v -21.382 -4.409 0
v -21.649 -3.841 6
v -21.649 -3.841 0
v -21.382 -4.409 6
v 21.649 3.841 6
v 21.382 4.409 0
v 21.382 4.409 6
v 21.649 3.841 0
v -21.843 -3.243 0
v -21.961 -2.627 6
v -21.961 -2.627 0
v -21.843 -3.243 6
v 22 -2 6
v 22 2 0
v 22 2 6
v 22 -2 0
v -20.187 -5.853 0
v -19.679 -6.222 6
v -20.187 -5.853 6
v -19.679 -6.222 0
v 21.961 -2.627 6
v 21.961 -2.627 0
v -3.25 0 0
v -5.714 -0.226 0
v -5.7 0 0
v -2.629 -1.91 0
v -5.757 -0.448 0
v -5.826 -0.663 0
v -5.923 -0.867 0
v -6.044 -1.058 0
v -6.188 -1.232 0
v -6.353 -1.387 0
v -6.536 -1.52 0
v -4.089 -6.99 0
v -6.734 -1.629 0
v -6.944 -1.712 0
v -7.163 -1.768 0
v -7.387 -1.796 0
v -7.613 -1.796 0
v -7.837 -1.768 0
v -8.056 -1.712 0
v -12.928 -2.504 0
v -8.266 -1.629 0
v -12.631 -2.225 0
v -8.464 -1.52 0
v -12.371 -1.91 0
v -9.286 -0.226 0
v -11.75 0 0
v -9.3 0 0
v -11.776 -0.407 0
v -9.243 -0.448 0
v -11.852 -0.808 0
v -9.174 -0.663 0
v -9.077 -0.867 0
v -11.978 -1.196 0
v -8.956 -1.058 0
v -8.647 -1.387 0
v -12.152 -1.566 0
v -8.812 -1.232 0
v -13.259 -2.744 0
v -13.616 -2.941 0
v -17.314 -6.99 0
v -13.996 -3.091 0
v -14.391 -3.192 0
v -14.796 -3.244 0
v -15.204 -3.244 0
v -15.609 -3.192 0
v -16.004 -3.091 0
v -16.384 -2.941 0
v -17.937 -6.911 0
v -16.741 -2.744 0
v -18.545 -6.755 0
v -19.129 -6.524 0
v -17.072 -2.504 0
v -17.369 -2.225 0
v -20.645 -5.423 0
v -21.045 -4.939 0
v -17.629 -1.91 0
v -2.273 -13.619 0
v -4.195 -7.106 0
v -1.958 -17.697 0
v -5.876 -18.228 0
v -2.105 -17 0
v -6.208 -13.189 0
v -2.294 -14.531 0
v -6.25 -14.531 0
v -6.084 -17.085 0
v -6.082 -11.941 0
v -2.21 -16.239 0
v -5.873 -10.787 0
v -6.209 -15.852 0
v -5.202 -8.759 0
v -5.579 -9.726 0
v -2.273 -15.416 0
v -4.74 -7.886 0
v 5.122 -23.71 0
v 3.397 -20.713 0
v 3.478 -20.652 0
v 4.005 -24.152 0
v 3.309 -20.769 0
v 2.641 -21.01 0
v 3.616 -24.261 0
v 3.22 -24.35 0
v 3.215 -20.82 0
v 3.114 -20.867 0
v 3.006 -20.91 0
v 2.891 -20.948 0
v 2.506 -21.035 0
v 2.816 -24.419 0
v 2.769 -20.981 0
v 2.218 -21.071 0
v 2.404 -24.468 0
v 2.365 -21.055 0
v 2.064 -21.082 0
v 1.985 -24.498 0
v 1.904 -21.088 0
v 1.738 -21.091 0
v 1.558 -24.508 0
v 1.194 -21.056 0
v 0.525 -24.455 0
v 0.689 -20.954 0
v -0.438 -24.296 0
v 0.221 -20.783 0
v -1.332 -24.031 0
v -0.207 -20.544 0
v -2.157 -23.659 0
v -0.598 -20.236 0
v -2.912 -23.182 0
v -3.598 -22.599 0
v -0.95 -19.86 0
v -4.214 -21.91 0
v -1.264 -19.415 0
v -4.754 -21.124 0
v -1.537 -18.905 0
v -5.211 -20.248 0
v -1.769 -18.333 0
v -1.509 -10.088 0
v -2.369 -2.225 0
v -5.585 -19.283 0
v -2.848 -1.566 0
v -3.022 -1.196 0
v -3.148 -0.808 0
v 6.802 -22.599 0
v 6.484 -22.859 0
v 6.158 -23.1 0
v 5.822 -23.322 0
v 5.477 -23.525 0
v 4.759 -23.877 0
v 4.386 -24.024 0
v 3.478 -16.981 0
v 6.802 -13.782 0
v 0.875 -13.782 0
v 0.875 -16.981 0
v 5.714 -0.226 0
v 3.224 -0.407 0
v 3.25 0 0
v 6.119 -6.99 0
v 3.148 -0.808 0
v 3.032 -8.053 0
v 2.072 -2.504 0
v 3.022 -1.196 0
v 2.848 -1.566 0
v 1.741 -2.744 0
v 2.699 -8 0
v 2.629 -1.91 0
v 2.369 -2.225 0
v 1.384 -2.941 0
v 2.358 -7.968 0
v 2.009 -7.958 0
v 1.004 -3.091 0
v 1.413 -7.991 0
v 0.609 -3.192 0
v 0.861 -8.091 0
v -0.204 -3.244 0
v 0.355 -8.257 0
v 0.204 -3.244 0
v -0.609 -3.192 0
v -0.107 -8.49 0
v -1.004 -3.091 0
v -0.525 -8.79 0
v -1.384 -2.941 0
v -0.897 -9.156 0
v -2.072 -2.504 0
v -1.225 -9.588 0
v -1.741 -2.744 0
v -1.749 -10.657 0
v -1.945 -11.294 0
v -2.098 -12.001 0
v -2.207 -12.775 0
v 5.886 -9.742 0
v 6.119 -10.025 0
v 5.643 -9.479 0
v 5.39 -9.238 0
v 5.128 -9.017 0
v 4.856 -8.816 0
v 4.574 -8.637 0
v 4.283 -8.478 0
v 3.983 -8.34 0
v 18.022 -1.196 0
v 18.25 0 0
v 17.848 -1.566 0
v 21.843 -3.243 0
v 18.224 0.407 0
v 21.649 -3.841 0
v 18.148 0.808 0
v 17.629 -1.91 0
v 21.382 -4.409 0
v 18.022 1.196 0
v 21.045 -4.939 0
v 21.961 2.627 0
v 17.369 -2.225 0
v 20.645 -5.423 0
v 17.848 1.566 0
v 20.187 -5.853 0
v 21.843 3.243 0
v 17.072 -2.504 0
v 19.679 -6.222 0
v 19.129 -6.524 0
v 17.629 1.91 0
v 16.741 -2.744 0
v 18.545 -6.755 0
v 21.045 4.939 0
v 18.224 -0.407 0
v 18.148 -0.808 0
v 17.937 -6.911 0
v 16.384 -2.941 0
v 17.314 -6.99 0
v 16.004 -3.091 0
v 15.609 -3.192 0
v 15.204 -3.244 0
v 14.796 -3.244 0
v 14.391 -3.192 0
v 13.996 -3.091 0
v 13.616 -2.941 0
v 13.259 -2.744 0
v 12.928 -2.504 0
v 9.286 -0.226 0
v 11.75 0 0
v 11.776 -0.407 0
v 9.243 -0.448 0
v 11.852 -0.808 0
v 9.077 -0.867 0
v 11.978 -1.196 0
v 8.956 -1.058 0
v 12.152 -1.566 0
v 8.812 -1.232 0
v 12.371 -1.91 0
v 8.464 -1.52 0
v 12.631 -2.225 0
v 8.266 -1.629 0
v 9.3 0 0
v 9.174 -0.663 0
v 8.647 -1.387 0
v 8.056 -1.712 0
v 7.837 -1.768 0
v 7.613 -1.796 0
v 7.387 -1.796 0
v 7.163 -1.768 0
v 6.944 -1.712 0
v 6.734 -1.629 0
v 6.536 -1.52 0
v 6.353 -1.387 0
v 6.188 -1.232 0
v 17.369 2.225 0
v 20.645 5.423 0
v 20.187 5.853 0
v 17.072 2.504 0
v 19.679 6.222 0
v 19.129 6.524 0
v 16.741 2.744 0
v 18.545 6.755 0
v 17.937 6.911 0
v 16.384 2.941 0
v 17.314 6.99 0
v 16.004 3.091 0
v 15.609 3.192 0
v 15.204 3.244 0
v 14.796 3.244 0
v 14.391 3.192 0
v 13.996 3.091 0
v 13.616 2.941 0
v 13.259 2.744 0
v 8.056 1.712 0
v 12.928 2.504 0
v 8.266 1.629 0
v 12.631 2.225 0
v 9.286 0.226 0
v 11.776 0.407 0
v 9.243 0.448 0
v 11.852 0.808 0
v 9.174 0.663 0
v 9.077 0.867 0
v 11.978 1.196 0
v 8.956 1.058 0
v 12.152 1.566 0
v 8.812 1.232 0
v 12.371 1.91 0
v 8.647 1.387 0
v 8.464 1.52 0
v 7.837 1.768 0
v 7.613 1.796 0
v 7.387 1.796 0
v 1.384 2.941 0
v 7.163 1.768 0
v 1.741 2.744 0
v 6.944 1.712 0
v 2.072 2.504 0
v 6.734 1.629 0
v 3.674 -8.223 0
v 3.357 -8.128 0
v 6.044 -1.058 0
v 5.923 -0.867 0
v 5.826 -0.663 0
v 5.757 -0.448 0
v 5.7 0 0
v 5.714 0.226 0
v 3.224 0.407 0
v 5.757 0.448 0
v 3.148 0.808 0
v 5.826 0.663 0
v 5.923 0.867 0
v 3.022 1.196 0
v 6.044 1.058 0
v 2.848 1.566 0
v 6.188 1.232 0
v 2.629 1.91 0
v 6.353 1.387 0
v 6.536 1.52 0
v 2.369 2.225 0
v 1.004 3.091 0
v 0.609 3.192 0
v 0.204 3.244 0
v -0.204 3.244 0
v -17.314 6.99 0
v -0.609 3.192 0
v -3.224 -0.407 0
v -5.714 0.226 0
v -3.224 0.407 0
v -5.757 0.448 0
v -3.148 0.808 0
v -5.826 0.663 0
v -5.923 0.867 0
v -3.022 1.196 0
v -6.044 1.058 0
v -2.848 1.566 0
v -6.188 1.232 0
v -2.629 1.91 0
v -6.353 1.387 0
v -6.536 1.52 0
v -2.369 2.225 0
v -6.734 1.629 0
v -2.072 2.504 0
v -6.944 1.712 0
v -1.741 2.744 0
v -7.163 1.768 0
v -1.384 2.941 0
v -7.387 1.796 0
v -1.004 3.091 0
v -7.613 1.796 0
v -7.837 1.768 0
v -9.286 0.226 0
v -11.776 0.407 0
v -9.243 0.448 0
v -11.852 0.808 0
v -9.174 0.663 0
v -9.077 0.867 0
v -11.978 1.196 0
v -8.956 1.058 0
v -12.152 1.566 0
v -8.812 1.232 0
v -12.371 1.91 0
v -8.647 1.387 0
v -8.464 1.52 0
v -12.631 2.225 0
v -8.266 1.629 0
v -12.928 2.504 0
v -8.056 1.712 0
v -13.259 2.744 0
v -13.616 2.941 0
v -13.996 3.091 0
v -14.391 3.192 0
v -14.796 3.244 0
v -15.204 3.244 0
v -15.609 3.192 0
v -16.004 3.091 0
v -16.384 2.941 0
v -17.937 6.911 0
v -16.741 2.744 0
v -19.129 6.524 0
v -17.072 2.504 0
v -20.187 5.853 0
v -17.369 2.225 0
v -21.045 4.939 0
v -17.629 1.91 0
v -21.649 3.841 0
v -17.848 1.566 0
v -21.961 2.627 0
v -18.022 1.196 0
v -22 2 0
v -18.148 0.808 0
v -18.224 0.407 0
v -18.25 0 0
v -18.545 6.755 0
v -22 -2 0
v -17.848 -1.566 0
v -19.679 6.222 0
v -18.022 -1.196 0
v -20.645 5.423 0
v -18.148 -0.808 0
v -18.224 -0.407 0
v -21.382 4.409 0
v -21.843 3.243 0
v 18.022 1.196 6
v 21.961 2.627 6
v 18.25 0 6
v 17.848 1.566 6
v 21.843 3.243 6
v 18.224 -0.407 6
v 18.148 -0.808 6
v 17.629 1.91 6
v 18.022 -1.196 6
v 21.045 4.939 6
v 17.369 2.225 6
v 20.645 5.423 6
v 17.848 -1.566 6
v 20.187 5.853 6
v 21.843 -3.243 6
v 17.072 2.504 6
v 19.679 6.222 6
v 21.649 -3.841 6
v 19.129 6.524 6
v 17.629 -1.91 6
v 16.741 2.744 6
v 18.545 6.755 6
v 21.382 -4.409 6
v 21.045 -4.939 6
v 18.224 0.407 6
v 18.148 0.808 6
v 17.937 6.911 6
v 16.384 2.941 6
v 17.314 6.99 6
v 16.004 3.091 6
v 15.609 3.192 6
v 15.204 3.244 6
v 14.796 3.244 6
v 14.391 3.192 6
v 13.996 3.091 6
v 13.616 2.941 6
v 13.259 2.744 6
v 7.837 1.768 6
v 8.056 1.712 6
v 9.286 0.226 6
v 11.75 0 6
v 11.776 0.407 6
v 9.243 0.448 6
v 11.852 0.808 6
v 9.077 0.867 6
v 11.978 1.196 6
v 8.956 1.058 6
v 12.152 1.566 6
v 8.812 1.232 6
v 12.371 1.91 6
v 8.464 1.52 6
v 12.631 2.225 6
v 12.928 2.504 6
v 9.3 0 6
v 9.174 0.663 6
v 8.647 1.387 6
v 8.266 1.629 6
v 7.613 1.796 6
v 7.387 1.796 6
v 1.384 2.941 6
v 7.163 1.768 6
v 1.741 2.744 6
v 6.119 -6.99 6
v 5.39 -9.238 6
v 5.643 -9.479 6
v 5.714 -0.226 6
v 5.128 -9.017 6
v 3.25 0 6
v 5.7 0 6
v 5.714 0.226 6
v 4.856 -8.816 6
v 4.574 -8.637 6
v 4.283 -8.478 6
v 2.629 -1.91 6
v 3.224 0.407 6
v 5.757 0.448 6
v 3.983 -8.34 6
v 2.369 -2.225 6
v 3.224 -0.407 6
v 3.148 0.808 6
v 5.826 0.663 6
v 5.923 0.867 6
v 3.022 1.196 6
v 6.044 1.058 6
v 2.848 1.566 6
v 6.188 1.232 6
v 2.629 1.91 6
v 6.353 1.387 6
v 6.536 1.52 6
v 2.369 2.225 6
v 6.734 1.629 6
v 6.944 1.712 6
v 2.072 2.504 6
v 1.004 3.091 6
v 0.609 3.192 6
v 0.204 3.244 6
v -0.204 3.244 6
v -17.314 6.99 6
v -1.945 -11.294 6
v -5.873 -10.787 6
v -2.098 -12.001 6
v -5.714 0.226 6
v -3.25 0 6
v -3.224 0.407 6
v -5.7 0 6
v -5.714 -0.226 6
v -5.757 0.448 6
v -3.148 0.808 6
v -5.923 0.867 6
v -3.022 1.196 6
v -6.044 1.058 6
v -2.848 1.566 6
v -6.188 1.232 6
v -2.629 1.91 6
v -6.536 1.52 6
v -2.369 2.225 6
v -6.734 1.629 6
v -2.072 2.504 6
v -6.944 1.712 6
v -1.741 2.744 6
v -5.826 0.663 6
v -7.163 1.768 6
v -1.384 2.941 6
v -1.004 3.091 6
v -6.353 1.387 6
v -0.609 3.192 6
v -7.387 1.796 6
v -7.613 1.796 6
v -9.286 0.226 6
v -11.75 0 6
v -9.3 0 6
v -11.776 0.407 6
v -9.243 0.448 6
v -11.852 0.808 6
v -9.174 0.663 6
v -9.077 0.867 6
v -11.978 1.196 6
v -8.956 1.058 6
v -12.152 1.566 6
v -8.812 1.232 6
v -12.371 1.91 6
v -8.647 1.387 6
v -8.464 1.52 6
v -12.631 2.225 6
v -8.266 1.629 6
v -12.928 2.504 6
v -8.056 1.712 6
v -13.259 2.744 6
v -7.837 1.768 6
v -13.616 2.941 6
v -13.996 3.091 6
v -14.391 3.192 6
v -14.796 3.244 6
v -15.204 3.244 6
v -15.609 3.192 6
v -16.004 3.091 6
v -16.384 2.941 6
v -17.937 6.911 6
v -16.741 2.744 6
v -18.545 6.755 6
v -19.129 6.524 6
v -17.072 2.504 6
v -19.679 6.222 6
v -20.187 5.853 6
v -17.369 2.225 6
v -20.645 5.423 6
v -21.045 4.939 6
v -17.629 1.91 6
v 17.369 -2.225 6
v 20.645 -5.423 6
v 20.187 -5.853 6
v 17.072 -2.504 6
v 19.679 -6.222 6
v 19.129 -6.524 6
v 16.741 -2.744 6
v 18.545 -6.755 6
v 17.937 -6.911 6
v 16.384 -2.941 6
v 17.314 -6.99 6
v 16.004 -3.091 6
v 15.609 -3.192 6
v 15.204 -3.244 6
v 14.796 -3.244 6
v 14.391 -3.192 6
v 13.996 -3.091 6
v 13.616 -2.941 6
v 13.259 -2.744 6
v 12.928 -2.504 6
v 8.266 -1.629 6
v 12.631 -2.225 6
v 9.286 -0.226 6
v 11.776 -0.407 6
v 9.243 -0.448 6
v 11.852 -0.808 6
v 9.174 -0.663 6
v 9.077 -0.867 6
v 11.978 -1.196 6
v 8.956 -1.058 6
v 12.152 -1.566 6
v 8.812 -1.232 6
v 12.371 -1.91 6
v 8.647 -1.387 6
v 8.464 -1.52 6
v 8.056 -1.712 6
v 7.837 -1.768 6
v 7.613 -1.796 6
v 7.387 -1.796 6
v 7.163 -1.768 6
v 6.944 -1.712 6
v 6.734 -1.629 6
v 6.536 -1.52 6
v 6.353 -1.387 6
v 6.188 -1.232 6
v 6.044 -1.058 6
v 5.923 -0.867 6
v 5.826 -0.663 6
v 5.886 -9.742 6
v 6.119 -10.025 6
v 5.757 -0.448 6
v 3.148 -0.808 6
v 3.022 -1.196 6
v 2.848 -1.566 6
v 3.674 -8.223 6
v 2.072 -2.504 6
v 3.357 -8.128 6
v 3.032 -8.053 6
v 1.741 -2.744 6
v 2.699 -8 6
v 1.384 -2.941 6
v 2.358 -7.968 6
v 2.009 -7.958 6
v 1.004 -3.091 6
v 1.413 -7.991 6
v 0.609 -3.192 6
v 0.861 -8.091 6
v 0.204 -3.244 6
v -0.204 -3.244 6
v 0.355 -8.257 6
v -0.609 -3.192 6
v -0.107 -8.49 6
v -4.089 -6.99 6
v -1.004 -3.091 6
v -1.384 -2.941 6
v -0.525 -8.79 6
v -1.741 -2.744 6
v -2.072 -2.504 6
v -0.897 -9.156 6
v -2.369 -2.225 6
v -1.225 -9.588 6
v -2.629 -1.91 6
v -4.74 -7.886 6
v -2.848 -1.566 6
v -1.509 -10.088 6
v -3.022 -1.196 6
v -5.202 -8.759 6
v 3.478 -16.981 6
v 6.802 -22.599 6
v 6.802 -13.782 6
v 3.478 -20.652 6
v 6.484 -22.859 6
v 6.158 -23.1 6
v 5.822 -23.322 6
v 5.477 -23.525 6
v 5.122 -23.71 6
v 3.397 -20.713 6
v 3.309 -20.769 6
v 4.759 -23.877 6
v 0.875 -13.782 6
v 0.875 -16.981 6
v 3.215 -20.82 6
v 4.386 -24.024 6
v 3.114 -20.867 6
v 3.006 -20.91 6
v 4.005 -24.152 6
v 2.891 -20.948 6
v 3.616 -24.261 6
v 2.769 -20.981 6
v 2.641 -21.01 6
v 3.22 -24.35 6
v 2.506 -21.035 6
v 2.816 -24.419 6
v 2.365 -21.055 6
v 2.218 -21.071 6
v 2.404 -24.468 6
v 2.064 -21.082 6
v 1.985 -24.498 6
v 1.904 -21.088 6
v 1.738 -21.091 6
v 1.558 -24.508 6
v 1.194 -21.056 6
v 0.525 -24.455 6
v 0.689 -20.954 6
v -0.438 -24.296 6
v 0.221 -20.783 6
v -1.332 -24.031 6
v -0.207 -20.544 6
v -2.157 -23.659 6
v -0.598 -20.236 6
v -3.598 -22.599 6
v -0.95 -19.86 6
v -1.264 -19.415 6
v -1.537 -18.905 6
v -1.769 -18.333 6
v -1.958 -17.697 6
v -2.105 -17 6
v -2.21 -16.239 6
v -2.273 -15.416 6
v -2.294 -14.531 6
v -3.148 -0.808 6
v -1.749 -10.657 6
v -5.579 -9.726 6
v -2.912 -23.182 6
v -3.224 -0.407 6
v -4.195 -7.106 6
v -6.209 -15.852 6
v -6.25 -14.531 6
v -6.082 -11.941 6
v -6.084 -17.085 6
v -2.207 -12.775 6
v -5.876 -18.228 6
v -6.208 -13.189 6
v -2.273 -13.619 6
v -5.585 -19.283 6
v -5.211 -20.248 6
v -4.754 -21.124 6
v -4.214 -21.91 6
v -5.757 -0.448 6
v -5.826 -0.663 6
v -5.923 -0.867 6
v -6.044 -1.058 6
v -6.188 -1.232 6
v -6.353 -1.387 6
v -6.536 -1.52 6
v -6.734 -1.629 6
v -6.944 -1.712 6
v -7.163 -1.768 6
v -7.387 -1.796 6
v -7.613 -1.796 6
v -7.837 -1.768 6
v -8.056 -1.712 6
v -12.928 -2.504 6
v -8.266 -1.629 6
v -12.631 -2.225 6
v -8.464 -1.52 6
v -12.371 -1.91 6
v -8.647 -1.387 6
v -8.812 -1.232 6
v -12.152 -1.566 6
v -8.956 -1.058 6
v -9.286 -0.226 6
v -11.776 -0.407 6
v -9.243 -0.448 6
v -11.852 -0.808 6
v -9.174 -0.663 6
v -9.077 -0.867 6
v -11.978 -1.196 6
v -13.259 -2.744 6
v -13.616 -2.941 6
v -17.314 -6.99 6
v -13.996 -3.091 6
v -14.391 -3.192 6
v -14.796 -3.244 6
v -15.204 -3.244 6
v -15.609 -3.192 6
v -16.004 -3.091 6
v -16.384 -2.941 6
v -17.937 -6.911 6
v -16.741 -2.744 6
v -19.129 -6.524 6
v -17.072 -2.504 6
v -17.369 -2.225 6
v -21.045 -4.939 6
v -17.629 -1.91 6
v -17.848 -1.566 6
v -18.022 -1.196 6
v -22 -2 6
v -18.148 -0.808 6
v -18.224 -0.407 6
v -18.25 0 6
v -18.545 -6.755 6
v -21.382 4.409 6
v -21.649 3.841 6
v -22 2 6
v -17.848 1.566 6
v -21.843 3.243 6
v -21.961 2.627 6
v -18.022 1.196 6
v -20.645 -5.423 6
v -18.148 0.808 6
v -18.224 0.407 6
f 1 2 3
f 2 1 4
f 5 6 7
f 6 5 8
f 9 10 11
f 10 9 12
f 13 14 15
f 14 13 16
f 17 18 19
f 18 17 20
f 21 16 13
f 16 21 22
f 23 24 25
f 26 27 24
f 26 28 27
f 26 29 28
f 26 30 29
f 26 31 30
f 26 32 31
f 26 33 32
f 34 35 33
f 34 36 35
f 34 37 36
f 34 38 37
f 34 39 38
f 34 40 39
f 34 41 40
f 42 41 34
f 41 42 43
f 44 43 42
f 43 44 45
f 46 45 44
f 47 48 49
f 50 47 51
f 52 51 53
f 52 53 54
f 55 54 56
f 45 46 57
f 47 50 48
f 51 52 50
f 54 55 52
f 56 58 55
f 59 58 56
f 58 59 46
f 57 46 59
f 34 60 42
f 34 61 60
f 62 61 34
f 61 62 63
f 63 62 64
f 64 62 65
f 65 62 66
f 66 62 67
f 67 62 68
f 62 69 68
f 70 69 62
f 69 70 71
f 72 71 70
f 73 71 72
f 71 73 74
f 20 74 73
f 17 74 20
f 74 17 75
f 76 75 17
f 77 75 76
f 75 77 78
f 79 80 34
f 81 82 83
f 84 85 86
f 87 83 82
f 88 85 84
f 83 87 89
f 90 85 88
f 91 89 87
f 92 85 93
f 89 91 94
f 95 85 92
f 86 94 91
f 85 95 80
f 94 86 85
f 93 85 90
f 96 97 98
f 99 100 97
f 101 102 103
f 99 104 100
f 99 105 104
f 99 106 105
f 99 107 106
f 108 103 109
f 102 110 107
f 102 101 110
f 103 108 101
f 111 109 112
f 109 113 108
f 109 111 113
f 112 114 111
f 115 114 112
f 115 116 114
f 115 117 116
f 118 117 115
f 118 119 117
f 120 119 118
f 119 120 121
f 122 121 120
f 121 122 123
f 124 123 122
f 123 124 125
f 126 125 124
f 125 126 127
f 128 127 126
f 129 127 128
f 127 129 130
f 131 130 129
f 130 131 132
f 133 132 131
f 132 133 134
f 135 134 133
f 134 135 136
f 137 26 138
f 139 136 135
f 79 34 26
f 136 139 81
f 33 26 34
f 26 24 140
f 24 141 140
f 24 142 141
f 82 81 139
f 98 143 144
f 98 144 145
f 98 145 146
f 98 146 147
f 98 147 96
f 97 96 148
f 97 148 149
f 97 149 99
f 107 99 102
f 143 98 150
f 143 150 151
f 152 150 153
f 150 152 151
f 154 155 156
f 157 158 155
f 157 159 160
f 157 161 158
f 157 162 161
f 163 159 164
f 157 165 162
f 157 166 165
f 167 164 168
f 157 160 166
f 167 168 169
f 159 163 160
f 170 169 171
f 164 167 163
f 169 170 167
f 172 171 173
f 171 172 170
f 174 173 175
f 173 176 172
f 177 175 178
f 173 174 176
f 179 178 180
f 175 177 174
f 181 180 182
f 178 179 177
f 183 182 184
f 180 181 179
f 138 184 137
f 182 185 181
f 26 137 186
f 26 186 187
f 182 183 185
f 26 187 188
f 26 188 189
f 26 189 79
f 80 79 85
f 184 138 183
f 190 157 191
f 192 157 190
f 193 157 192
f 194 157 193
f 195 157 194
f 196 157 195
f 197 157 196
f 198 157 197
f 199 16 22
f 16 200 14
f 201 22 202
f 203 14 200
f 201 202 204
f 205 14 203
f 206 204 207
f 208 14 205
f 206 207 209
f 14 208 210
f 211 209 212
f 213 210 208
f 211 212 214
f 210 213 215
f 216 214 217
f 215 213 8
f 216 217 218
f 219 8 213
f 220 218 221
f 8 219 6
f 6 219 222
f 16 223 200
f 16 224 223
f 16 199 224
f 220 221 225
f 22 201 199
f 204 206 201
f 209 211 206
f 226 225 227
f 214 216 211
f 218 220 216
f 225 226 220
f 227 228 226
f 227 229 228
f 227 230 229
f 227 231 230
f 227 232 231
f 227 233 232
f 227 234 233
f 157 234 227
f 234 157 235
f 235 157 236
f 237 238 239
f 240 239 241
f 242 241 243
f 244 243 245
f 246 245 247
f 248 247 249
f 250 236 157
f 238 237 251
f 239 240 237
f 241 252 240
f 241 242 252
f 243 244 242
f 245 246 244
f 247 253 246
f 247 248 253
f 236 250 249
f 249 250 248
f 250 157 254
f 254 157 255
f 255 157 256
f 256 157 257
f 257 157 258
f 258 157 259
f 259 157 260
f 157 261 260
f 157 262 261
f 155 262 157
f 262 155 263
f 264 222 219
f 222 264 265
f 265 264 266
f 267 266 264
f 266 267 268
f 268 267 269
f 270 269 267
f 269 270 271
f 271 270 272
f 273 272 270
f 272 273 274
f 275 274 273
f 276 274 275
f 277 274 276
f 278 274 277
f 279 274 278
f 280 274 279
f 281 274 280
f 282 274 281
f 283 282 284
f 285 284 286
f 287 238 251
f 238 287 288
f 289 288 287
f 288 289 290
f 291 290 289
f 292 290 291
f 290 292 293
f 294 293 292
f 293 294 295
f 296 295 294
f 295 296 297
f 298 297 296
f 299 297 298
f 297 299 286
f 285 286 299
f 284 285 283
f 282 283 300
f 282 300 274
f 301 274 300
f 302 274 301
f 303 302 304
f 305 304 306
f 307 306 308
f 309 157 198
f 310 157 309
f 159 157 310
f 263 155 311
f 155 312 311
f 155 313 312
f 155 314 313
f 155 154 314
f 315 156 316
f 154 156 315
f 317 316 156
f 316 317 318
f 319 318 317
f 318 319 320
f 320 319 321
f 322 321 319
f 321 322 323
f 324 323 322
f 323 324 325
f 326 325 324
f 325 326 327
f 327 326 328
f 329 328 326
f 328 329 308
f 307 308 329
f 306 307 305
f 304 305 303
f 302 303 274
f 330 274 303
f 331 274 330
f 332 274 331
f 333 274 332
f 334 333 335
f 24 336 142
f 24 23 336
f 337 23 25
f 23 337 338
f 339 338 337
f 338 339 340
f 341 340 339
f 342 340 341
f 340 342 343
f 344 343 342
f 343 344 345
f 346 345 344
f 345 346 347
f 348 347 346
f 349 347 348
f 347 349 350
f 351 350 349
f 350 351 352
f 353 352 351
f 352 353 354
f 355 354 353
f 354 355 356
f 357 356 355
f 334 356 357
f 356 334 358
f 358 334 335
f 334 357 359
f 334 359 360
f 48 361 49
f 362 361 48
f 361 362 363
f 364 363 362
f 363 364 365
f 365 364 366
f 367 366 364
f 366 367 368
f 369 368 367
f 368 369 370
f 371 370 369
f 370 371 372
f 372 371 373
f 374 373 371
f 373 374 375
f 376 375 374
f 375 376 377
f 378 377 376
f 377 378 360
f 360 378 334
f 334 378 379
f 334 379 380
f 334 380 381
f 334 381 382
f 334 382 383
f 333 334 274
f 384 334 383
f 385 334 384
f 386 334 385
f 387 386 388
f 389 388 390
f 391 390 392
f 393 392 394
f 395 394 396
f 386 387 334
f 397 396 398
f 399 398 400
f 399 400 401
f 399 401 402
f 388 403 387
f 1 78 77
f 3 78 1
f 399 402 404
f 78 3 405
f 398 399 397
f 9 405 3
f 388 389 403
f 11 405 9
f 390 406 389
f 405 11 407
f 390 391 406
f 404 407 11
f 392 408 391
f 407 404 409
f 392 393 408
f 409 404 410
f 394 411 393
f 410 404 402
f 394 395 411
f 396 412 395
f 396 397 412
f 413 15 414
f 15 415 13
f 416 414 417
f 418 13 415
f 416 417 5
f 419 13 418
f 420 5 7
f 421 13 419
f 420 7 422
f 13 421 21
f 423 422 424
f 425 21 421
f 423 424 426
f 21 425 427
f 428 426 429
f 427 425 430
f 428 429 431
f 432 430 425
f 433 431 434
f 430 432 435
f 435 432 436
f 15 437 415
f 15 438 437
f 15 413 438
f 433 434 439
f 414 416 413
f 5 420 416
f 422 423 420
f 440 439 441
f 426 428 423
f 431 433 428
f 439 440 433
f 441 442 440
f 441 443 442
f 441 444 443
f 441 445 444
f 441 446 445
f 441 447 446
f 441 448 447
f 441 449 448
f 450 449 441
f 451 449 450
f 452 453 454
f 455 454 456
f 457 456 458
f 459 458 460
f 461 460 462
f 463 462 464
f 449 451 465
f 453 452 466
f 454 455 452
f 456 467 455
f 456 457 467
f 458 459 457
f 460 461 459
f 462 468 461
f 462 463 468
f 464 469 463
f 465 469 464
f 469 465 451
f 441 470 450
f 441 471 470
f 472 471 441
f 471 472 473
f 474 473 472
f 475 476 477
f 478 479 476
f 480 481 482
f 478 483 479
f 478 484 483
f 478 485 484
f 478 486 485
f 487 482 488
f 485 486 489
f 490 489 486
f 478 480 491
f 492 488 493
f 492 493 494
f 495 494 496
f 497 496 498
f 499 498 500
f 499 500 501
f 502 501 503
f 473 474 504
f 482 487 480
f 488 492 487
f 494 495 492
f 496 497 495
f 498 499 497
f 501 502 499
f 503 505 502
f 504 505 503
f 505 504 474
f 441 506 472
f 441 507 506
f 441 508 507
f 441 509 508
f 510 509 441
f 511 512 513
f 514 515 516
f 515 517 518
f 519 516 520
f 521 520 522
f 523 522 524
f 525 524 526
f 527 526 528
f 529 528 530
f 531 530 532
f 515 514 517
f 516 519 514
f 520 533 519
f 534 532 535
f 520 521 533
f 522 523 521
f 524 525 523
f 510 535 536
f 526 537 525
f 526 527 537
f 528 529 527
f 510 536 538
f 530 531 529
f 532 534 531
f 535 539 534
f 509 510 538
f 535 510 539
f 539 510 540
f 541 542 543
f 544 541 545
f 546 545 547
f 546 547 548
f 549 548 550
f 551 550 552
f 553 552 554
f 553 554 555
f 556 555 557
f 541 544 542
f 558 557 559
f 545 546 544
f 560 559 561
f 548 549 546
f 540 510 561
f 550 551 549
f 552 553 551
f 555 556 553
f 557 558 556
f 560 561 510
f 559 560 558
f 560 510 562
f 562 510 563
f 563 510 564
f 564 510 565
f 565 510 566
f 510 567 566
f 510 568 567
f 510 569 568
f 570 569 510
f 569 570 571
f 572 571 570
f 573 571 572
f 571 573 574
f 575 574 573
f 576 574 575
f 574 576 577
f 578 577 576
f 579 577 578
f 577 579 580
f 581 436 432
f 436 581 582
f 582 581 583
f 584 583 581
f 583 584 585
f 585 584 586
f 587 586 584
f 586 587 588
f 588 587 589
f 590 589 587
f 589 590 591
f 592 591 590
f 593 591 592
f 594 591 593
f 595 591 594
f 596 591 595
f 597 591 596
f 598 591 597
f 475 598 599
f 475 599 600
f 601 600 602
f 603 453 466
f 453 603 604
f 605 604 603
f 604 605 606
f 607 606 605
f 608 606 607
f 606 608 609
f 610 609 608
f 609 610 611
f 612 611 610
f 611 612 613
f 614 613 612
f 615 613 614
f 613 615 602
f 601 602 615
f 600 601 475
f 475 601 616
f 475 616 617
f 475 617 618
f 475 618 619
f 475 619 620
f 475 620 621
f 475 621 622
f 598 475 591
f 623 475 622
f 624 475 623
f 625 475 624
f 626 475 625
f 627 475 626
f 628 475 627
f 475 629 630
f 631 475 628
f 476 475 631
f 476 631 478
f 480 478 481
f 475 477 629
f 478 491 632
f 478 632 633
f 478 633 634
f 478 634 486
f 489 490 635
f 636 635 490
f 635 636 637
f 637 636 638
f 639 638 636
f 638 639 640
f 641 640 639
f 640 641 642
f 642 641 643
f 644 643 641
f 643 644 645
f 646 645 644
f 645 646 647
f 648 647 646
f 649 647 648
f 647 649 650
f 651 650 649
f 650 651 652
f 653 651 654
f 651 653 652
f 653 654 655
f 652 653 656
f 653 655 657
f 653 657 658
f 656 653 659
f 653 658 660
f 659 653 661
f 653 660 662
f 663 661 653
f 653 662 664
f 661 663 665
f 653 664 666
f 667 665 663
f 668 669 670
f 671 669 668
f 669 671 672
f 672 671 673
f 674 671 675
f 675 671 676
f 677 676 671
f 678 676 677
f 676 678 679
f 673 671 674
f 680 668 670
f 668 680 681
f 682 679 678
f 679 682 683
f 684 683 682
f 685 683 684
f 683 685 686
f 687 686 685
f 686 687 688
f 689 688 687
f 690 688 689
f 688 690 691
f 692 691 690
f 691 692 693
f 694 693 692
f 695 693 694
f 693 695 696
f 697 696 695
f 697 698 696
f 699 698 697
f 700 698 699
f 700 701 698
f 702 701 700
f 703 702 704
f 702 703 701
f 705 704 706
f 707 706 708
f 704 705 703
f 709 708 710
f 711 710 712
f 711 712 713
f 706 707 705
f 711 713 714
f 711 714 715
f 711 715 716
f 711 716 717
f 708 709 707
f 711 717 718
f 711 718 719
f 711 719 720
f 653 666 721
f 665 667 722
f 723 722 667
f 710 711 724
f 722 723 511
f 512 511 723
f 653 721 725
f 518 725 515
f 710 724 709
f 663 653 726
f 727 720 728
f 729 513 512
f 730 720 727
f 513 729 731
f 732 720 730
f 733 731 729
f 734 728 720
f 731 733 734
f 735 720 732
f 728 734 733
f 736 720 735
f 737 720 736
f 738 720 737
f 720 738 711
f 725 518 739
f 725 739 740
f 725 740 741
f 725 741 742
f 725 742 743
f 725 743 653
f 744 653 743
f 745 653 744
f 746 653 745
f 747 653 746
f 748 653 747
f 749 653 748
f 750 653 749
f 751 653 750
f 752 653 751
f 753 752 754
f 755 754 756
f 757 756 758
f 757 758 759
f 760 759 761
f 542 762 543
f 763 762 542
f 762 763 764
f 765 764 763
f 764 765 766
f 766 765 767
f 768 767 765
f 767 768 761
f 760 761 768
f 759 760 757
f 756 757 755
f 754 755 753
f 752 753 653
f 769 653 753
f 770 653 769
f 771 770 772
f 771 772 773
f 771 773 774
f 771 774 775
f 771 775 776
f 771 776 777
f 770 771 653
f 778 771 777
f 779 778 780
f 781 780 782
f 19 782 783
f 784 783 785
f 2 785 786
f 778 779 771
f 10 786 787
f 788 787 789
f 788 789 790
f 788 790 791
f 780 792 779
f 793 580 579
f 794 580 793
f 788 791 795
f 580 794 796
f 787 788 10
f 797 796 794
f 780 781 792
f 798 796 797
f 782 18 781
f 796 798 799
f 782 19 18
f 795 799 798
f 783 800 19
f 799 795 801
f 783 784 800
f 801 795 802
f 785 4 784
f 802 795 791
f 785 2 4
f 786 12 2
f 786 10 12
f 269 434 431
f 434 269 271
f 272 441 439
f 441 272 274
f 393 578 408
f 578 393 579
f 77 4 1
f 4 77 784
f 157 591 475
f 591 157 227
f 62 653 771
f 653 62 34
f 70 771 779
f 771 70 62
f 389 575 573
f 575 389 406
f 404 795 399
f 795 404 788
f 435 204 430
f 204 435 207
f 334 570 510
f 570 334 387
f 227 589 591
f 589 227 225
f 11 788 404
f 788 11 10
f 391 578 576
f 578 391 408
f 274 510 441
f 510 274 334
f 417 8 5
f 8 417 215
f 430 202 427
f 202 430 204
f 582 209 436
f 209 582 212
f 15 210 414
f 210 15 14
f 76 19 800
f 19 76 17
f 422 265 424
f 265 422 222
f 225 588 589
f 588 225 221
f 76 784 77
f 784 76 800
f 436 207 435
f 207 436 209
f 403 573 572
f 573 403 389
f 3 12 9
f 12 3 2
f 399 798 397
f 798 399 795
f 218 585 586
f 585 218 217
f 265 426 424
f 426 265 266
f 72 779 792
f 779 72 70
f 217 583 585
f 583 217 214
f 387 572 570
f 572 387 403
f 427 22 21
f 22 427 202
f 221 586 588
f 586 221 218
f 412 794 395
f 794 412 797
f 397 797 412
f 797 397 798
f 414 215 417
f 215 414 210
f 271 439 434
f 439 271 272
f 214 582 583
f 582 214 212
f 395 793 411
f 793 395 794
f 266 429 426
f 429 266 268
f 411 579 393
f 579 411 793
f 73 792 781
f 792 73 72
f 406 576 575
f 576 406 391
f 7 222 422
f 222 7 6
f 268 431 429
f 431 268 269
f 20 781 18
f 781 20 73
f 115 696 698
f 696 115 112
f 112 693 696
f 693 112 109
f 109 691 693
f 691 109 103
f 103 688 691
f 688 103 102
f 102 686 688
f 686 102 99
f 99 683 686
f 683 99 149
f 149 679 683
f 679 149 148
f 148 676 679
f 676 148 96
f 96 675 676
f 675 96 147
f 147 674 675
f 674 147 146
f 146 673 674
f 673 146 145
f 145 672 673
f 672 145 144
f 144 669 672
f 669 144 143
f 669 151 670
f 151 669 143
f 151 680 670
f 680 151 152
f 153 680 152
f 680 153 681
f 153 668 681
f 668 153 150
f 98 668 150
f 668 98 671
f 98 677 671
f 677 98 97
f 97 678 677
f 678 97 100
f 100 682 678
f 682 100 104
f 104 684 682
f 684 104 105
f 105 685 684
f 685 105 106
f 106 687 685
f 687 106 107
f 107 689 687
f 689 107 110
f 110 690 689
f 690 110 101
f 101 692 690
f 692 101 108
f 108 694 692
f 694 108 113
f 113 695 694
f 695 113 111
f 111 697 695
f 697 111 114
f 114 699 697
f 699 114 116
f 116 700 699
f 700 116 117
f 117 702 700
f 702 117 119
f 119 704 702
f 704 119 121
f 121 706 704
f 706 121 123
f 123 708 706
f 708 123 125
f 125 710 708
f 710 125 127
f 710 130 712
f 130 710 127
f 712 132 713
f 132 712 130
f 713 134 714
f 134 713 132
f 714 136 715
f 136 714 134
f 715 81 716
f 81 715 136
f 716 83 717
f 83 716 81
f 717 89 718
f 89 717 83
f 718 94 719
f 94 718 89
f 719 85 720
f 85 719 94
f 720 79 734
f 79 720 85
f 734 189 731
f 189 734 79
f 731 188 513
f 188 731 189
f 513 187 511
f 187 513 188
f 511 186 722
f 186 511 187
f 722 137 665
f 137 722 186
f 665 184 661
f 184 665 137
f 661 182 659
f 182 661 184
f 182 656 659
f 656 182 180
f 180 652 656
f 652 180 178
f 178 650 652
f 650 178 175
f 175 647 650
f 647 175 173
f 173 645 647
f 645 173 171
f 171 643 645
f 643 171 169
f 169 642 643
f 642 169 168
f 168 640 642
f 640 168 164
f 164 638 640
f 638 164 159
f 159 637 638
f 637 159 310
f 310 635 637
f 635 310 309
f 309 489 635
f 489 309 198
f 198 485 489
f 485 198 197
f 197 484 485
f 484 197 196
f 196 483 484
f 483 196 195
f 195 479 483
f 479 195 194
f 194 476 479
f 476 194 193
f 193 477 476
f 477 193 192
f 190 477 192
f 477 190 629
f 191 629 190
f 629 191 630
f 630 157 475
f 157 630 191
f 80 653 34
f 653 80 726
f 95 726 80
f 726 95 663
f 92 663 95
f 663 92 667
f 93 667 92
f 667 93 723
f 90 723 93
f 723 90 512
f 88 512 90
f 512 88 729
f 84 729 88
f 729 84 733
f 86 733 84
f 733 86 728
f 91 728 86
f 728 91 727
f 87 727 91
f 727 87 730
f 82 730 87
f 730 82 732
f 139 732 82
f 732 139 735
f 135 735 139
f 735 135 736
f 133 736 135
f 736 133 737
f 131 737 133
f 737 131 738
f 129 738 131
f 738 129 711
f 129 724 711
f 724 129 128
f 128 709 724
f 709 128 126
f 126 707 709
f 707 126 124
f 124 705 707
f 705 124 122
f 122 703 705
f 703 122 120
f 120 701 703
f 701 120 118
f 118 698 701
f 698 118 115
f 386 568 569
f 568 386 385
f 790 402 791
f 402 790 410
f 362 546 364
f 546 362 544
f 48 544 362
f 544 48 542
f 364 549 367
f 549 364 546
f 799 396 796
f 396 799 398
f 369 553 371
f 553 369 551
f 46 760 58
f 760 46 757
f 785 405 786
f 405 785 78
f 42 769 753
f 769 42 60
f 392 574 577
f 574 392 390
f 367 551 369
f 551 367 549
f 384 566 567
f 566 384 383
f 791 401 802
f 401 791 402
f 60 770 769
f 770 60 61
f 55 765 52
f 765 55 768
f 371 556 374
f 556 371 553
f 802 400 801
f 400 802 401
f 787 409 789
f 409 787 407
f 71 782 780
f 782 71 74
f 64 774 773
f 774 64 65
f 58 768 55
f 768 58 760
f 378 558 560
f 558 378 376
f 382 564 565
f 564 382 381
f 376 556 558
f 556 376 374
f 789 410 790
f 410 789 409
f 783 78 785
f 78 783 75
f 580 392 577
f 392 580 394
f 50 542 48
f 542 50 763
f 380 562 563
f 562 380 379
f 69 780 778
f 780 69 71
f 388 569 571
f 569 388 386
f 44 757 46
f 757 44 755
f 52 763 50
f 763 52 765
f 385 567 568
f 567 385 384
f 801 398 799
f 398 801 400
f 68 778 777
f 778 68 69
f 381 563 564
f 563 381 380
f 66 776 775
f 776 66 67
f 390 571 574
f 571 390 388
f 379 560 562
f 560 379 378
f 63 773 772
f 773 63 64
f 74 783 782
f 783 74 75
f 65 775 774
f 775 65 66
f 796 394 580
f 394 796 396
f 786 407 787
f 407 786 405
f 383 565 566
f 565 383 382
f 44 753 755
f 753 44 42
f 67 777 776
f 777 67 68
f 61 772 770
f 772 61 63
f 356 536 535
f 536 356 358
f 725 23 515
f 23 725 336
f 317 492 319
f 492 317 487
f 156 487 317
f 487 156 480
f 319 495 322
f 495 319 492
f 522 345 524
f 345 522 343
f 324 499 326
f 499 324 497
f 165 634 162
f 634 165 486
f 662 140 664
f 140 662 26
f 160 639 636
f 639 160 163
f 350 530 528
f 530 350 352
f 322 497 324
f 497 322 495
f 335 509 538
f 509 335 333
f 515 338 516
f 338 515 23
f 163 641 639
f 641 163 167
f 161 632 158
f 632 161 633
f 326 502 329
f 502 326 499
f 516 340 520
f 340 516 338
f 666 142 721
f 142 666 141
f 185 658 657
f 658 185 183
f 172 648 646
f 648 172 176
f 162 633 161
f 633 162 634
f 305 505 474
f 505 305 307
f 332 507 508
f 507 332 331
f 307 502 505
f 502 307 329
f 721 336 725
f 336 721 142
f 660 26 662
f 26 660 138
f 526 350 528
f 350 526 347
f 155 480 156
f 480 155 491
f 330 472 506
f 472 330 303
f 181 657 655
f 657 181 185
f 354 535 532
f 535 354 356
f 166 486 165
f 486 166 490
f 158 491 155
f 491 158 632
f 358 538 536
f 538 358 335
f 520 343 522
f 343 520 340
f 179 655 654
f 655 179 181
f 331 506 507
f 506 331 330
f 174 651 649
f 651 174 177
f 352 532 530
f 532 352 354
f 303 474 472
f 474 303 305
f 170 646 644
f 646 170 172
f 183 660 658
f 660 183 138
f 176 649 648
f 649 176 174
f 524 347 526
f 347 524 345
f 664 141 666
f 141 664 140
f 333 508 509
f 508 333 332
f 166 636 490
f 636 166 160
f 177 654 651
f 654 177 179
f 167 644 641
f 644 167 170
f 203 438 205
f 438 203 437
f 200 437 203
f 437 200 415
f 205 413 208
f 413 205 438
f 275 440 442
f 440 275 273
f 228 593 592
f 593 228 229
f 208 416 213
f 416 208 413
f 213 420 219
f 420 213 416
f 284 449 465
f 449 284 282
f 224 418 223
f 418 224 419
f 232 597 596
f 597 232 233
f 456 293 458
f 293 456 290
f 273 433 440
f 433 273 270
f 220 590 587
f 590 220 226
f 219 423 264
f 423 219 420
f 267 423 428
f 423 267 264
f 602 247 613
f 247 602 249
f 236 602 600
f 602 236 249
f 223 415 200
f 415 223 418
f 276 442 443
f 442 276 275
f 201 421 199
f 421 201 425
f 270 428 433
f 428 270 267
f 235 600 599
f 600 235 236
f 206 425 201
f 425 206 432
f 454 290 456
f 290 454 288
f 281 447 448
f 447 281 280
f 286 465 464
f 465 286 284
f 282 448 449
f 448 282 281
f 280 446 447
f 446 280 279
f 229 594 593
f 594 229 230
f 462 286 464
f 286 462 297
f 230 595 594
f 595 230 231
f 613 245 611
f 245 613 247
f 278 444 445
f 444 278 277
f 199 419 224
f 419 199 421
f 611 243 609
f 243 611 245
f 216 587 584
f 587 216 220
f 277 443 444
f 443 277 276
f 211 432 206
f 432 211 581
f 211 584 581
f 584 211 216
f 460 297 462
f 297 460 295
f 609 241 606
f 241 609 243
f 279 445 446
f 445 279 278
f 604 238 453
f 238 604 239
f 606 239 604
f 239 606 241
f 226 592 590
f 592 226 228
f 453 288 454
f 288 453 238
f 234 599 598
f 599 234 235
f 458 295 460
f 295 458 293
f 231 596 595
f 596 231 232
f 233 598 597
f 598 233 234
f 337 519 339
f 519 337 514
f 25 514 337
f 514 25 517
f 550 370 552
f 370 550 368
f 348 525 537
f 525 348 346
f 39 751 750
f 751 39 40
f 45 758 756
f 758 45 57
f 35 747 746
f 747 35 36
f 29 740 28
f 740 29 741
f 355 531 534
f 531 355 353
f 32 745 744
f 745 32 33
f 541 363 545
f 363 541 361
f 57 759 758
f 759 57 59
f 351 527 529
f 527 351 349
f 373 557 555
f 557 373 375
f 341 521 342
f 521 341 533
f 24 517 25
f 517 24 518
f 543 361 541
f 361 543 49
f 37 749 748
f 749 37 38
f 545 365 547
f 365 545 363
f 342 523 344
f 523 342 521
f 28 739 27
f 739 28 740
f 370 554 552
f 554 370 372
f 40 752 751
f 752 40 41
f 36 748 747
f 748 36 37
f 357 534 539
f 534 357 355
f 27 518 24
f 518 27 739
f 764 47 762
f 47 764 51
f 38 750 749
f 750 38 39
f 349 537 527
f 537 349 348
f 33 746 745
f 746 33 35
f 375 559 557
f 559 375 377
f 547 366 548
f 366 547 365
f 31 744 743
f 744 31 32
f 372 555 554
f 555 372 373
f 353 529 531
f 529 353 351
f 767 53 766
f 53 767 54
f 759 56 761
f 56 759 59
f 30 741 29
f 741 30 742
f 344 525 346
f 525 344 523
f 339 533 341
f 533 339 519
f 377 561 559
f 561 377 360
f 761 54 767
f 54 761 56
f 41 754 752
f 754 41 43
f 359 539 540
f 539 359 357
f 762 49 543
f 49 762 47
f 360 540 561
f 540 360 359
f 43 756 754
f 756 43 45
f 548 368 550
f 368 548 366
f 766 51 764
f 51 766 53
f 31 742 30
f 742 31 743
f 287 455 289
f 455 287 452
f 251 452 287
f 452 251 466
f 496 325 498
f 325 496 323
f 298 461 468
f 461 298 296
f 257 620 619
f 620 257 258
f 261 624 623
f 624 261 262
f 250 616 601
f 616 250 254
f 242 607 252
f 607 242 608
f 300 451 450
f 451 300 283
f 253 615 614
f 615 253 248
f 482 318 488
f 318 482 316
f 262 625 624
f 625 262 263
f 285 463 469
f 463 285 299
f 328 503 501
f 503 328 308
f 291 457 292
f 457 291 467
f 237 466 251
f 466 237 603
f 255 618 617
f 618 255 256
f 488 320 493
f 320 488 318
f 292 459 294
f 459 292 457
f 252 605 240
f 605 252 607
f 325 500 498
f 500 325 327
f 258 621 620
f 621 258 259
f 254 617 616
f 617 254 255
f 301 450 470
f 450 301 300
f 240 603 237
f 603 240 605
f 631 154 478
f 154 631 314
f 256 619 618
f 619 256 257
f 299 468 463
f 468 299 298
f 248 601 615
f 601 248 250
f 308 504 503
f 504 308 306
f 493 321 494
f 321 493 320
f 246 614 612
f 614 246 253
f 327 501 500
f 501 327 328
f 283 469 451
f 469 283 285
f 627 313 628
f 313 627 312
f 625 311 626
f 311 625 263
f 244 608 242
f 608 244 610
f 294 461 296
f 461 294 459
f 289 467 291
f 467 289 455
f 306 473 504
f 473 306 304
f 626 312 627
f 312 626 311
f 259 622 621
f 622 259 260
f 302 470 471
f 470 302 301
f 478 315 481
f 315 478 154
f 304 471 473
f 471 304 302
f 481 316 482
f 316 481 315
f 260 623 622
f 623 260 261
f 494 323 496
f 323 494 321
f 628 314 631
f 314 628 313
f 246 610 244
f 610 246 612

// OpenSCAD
$fn = 50;


difference() {
	union() {
		hull() {
			translate(v = [-17.0000000000, 2.0000000000, 0]) {
				cylinder(h = 6, r = 5);
			}
			translate(v = [17.0000000000, 2.0000000000, 0]) {
				cylinder(h = 6, r = 5);
			}
			translate(v = [-17.0000000000, -2.0000000000, 0]) {
				cylinder(h = 6, r = 5);
			}
			translate(v = [17.0000000000, -2.0000000000, 0]) {
				cylinder(h = 6, r = 5);
			}
		}
		translate(v = [0, -5, 0]) {
			linear_extrude(height = 6) {
				text(font = "DejaVu Sans Mono:style=Bold", halign = "center", size = 19.0000000000, text = "G", valign = "top");
			}
		}
	}
	union() {
		translate(v = [-15.0000000000, 0.0000000000, 0]) {
			translate(v = [0, 0, -100]) {
				cylinder(h = 200, r = 3.2500000000);
			}
		}
		translate(v = [0, 0, -100]) {
			cylinder(h = 200, r = 3.2500000000);
		}
		translate(v = [15.0000000000, 0.0000000000, 0]) {
			translate(v = [0, 0, -100]) {
				cylinder(h = 200, r = 3.2500000000);
			}
		}
		translate(v = [-15.0000000000, 0.0000000000, 0]) {
			translate(v = [0, 0, -100]) {
				cylinder(h = 200, r = 1.8000000000);
			}
		}
		translate(v = [-7.5000000000, 0.0000000000, 0]) {
			translate(v = [0, 0, -100]) {
				cylinder(h = 200, r = 1.8000000000);
			}
		}
		translate(v = [0, 0, -100]) {
			cylinder(h = 200, r = 1.8000000000);
		}
		translate(v = [7.5000000000, 0.0000000000, 0]) {
			translate(v = [0, 0, -100]) {
				cylinder(h = 200, r = 1.8000000000);
			}
		}
		translate(v = [15.0000000000, 0.0000000000, 0]) {
			translate(v = [0, 0, -100]) {
				cylinder(h = 200, r = 1.8000000000);
			}
		}
	}
}
